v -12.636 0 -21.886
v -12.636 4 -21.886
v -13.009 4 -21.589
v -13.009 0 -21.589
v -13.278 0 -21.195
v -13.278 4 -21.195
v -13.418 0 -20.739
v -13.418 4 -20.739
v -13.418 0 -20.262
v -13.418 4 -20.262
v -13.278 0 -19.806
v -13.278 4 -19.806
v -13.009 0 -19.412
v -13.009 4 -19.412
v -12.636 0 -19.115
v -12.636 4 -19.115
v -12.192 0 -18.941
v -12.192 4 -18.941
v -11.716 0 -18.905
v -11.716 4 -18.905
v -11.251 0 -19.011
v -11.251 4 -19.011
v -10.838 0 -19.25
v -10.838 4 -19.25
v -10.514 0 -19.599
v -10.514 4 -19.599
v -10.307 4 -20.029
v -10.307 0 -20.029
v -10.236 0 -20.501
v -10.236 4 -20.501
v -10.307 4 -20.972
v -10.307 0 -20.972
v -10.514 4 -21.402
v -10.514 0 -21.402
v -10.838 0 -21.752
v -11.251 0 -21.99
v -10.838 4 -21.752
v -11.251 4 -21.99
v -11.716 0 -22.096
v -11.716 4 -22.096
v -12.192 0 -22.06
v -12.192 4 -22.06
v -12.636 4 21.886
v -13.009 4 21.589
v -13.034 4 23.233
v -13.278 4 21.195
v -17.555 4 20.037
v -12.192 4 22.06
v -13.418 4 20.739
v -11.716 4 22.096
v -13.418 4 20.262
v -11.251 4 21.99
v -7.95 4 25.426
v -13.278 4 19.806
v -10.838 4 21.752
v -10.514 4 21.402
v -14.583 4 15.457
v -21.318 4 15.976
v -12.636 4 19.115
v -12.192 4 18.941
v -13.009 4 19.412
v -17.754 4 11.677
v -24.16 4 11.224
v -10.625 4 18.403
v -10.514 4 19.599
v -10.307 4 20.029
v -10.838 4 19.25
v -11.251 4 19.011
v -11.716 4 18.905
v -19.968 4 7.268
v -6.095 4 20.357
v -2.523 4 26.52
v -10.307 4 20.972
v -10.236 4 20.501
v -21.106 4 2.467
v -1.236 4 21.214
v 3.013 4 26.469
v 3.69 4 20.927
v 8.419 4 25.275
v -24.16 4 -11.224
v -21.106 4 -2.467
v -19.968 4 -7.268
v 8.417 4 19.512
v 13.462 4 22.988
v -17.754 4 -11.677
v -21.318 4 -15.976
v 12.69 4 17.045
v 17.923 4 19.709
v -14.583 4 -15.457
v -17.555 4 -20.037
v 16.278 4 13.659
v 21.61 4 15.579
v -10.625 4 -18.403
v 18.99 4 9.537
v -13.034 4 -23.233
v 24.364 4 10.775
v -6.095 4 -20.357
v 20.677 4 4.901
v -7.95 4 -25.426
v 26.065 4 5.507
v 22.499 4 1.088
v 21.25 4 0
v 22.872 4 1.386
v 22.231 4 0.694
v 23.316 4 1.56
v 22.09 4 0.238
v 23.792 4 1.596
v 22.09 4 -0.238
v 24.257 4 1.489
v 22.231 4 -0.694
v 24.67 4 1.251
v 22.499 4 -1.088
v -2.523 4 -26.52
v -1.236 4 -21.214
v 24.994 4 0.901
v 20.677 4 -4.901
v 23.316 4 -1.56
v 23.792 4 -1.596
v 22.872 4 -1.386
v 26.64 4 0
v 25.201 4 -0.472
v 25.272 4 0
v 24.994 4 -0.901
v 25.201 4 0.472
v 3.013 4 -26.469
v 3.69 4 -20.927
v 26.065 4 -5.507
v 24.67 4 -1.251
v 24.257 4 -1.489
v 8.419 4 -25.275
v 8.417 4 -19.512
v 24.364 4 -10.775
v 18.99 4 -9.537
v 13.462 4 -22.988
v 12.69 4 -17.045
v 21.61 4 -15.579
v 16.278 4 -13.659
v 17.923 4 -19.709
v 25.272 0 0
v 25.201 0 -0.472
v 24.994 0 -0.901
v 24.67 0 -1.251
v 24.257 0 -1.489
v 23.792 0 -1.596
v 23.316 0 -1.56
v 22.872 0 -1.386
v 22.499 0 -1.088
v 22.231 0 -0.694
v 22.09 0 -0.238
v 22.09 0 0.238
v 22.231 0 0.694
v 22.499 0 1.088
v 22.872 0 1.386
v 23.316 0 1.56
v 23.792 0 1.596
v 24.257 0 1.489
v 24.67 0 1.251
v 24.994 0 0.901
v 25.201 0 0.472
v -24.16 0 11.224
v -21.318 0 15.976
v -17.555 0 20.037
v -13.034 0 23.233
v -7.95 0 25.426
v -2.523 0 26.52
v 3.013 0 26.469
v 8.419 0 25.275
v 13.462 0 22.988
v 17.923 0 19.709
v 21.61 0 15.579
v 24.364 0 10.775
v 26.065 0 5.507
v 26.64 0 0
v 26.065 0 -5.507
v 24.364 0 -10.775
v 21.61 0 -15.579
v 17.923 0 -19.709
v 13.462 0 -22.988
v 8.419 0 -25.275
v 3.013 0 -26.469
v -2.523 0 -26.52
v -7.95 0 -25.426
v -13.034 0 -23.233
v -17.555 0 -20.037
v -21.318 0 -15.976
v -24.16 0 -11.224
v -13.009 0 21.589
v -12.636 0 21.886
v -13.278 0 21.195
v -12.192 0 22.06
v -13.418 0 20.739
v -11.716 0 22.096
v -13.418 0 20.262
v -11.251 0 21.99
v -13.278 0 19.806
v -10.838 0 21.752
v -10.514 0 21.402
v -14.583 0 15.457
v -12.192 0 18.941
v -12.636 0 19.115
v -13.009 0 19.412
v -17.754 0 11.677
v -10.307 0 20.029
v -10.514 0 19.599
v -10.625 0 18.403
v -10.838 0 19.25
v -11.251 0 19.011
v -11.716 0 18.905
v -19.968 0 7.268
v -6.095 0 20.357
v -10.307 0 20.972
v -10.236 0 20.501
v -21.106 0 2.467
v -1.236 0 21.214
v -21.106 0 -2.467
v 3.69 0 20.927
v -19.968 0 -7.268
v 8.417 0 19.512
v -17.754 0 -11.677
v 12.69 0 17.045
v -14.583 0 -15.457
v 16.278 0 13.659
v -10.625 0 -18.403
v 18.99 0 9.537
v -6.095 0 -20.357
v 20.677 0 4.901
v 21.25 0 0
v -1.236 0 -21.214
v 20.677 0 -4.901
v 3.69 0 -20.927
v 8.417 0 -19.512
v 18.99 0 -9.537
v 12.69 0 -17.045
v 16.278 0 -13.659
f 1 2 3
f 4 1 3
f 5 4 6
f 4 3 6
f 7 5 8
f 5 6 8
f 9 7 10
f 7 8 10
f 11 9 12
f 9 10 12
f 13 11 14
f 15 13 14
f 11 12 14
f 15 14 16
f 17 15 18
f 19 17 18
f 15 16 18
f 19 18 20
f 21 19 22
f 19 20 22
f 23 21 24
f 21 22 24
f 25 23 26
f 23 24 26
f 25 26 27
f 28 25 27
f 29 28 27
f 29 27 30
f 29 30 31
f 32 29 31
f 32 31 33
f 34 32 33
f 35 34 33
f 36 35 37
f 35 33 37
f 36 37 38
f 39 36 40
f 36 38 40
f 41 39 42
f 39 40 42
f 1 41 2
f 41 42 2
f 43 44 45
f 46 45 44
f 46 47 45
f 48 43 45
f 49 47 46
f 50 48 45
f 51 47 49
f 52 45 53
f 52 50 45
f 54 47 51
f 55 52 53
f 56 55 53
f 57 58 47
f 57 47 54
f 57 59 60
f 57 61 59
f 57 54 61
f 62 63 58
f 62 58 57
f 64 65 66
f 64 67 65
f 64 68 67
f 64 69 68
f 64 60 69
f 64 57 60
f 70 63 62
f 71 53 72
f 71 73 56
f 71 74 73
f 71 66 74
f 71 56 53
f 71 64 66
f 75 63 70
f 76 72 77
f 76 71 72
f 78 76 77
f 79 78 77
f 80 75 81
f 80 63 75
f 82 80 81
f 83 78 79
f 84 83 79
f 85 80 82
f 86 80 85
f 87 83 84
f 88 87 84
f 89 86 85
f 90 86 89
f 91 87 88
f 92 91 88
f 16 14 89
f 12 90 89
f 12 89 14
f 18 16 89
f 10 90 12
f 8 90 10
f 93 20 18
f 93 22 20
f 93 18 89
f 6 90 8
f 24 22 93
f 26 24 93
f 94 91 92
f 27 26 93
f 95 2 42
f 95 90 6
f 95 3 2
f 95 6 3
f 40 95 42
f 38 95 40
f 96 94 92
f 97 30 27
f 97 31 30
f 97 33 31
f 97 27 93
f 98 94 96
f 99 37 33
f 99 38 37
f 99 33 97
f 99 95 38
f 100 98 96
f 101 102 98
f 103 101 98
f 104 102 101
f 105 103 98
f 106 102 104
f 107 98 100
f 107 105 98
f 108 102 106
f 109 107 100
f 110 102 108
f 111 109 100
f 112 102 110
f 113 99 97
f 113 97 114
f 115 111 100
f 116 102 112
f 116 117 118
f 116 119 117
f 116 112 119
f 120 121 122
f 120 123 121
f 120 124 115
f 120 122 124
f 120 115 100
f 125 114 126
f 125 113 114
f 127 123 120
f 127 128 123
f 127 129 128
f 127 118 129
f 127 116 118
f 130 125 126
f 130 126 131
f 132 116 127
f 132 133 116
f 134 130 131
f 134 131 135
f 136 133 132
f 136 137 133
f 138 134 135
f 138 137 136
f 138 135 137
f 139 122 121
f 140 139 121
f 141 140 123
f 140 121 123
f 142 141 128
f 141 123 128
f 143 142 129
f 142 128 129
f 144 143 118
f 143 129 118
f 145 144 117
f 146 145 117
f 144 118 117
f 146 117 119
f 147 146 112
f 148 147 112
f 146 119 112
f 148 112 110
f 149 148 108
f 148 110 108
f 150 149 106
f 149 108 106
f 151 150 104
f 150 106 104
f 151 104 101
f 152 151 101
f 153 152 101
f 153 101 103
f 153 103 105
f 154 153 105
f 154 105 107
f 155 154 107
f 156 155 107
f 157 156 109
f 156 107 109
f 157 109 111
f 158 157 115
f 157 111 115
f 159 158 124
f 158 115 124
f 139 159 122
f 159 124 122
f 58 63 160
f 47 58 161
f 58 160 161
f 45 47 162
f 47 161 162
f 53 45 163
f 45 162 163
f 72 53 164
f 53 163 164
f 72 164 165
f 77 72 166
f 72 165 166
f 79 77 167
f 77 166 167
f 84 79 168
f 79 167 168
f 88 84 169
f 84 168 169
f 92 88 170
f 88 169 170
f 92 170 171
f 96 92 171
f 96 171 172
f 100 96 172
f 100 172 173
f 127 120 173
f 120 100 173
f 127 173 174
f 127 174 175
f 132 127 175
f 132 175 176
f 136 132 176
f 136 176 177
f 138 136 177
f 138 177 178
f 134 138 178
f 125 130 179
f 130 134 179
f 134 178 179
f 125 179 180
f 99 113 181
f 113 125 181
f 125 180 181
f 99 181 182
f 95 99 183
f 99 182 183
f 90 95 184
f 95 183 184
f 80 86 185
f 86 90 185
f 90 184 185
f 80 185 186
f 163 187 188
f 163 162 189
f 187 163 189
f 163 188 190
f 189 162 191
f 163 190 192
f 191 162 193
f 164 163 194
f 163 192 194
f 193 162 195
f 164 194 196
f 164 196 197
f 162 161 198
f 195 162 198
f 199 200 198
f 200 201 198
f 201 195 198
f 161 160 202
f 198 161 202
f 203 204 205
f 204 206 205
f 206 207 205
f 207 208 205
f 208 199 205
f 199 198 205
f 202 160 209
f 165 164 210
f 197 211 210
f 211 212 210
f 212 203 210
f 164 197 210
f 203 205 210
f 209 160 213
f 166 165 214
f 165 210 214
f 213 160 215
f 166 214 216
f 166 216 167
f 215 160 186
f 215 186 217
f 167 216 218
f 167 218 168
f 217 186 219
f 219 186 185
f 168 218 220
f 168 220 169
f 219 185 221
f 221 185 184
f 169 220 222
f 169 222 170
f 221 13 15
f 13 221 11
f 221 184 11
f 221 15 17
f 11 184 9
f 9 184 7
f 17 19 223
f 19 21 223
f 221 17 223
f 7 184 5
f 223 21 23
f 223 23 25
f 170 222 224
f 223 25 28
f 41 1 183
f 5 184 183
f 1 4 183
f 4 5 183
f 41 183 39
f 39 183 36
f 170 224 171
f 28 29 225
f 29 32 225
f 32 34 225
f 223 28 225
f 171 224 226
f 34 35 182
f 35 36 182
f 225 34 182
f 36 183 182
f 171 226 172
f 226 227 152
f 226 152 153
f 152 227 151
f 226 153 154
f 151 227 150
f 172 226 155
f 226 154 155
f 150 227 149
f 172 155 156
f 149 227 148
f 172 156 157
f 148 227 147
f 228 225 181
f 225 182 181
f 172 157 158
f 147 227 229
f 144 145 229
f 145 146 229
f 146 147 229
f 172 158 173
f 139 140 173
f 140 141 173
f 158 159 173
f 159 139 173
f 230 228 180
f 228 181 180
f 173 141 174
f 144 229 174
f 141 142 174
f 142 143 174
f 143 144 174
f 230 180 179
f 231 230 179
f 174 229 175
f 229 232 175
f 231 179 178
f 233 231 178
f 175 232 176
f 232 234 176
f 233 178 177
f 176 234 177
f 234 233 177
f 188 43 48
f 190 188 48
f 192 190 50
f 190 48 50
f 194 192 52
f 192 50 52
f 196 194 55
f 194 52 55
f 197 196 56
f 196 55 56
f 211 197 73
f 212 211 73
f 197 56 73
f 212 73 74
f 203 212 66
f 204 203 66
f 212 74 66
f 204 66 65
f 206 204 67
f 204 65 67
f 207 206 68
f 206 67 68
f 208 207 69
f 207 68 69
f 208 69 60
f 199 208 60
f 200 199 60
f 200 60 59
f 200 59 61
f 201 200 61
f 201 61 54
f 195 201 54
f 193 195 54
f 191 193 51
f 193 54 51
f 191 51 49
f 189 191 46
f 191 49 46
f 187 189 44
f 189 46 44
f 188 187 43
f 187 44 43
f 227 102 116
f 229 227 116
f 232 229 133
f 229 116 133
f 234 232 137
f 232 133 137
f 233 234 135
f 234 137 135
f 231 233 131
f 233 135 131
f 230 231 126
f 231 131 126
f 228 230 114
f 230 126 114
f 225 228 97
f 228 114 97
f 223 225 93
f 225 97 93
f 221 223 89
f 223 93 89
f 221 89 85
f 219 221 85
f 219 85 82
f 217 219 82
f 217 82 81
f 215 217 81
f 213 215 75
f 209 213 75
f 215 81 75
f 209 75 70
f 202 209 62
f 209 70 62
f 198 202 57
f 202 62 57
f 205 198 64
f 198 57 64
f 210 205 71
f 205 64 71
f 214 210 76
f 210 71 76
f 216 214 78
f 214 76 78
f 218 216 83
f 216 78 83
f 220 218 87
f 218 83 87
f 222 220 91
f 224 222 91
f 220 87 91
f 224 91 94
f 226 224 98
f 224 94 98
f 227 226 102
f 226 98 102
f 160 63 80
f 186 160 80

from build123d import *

# Parameters (mm, degrees)
SKETCH_1_R               = 26.64
EXTRUDE_1_DEPTH          = 4
SKETCH_2_R               = 21.25
CUT_EXTRUDE_1_DEPTH      = 4
SKETCH_3_R               = 1.6
CUT_EXTRUDE_2_DEPTH      = 4
PATTERN_CIRCULAR_1_COUNT = 3
SKETCH_5_W               = 17.203489066
SKETCH_5_H               = 59.100654928
CUT_EXTRUDE_3_DEPTH      = 4


with BuildPart() as part:
    # 草图1 → 凸台-拉伸1 (new body)
    with BuildSketch(Plane(origin=(0, 0, 0), x_dir=(1, 0, 0), z_dir=(0, 1, 0))):
        Circle(SKETCH_1_R)
    extrude(amount=EXTRUDE_1_DEPTH)

    # 草图2 → 切除-拉伸1 (cut)
    with BuildSketch(Plane(origin=(0, 4, 0), x_dir=(1, 0, 0), z_dir=(0, 1, 0))):
        Circle(SKETCH_2_R)
    extrude(amount=-CUT_EXTRUDE_1_DEPTH, mode=Mode.SUBTRACT)

    # 草图3 → 切除-拉伸2 (cut)
    with BuildSketch(Plane(origin=(0, 4, 0), x_dir=(1, 0, 0), z_dir=(0, 1, 0))):
        with Locations((23.672055427, 0)):
            Circle(SKETCH_3_R)
    cut_extrude_2 = extrude(amount=-CUT_EXTRUDE_2_DEPTH, mode=Mode.SUBTRACT)

    # 阵列(圆周)1: 切除-拉伸2 ×3 about axis
    pattern_circular_1_axis = Axis((0, 0, 0), (0, 1, 0))
    for i in range(1, PATTERN_CIRCULAR_1_COUNT):
        add(cut_extrude_2.rotate(pattern_circular_1_axis, i * 360 / PATTERN_CIRCULAR_1_COUNT), mode=Mode.SUBTRACT)

    # 草图5 → 切除-拉伸3 (cut)
    with BuildSketch(Plane(origin=(0, 4, 0), x_dir=(1, 0, 0), z_dir=(0, 1, 0))):
        with Locations((-32.761744533, -1.256680407)):
            Rectangle(SKETCH_5_W, SKETCH_5_H)
    extrude(amount=-CUT_EXTRUDE_3_DEPTH, mode=Mode.SUBTRACT)


solid = part.part
